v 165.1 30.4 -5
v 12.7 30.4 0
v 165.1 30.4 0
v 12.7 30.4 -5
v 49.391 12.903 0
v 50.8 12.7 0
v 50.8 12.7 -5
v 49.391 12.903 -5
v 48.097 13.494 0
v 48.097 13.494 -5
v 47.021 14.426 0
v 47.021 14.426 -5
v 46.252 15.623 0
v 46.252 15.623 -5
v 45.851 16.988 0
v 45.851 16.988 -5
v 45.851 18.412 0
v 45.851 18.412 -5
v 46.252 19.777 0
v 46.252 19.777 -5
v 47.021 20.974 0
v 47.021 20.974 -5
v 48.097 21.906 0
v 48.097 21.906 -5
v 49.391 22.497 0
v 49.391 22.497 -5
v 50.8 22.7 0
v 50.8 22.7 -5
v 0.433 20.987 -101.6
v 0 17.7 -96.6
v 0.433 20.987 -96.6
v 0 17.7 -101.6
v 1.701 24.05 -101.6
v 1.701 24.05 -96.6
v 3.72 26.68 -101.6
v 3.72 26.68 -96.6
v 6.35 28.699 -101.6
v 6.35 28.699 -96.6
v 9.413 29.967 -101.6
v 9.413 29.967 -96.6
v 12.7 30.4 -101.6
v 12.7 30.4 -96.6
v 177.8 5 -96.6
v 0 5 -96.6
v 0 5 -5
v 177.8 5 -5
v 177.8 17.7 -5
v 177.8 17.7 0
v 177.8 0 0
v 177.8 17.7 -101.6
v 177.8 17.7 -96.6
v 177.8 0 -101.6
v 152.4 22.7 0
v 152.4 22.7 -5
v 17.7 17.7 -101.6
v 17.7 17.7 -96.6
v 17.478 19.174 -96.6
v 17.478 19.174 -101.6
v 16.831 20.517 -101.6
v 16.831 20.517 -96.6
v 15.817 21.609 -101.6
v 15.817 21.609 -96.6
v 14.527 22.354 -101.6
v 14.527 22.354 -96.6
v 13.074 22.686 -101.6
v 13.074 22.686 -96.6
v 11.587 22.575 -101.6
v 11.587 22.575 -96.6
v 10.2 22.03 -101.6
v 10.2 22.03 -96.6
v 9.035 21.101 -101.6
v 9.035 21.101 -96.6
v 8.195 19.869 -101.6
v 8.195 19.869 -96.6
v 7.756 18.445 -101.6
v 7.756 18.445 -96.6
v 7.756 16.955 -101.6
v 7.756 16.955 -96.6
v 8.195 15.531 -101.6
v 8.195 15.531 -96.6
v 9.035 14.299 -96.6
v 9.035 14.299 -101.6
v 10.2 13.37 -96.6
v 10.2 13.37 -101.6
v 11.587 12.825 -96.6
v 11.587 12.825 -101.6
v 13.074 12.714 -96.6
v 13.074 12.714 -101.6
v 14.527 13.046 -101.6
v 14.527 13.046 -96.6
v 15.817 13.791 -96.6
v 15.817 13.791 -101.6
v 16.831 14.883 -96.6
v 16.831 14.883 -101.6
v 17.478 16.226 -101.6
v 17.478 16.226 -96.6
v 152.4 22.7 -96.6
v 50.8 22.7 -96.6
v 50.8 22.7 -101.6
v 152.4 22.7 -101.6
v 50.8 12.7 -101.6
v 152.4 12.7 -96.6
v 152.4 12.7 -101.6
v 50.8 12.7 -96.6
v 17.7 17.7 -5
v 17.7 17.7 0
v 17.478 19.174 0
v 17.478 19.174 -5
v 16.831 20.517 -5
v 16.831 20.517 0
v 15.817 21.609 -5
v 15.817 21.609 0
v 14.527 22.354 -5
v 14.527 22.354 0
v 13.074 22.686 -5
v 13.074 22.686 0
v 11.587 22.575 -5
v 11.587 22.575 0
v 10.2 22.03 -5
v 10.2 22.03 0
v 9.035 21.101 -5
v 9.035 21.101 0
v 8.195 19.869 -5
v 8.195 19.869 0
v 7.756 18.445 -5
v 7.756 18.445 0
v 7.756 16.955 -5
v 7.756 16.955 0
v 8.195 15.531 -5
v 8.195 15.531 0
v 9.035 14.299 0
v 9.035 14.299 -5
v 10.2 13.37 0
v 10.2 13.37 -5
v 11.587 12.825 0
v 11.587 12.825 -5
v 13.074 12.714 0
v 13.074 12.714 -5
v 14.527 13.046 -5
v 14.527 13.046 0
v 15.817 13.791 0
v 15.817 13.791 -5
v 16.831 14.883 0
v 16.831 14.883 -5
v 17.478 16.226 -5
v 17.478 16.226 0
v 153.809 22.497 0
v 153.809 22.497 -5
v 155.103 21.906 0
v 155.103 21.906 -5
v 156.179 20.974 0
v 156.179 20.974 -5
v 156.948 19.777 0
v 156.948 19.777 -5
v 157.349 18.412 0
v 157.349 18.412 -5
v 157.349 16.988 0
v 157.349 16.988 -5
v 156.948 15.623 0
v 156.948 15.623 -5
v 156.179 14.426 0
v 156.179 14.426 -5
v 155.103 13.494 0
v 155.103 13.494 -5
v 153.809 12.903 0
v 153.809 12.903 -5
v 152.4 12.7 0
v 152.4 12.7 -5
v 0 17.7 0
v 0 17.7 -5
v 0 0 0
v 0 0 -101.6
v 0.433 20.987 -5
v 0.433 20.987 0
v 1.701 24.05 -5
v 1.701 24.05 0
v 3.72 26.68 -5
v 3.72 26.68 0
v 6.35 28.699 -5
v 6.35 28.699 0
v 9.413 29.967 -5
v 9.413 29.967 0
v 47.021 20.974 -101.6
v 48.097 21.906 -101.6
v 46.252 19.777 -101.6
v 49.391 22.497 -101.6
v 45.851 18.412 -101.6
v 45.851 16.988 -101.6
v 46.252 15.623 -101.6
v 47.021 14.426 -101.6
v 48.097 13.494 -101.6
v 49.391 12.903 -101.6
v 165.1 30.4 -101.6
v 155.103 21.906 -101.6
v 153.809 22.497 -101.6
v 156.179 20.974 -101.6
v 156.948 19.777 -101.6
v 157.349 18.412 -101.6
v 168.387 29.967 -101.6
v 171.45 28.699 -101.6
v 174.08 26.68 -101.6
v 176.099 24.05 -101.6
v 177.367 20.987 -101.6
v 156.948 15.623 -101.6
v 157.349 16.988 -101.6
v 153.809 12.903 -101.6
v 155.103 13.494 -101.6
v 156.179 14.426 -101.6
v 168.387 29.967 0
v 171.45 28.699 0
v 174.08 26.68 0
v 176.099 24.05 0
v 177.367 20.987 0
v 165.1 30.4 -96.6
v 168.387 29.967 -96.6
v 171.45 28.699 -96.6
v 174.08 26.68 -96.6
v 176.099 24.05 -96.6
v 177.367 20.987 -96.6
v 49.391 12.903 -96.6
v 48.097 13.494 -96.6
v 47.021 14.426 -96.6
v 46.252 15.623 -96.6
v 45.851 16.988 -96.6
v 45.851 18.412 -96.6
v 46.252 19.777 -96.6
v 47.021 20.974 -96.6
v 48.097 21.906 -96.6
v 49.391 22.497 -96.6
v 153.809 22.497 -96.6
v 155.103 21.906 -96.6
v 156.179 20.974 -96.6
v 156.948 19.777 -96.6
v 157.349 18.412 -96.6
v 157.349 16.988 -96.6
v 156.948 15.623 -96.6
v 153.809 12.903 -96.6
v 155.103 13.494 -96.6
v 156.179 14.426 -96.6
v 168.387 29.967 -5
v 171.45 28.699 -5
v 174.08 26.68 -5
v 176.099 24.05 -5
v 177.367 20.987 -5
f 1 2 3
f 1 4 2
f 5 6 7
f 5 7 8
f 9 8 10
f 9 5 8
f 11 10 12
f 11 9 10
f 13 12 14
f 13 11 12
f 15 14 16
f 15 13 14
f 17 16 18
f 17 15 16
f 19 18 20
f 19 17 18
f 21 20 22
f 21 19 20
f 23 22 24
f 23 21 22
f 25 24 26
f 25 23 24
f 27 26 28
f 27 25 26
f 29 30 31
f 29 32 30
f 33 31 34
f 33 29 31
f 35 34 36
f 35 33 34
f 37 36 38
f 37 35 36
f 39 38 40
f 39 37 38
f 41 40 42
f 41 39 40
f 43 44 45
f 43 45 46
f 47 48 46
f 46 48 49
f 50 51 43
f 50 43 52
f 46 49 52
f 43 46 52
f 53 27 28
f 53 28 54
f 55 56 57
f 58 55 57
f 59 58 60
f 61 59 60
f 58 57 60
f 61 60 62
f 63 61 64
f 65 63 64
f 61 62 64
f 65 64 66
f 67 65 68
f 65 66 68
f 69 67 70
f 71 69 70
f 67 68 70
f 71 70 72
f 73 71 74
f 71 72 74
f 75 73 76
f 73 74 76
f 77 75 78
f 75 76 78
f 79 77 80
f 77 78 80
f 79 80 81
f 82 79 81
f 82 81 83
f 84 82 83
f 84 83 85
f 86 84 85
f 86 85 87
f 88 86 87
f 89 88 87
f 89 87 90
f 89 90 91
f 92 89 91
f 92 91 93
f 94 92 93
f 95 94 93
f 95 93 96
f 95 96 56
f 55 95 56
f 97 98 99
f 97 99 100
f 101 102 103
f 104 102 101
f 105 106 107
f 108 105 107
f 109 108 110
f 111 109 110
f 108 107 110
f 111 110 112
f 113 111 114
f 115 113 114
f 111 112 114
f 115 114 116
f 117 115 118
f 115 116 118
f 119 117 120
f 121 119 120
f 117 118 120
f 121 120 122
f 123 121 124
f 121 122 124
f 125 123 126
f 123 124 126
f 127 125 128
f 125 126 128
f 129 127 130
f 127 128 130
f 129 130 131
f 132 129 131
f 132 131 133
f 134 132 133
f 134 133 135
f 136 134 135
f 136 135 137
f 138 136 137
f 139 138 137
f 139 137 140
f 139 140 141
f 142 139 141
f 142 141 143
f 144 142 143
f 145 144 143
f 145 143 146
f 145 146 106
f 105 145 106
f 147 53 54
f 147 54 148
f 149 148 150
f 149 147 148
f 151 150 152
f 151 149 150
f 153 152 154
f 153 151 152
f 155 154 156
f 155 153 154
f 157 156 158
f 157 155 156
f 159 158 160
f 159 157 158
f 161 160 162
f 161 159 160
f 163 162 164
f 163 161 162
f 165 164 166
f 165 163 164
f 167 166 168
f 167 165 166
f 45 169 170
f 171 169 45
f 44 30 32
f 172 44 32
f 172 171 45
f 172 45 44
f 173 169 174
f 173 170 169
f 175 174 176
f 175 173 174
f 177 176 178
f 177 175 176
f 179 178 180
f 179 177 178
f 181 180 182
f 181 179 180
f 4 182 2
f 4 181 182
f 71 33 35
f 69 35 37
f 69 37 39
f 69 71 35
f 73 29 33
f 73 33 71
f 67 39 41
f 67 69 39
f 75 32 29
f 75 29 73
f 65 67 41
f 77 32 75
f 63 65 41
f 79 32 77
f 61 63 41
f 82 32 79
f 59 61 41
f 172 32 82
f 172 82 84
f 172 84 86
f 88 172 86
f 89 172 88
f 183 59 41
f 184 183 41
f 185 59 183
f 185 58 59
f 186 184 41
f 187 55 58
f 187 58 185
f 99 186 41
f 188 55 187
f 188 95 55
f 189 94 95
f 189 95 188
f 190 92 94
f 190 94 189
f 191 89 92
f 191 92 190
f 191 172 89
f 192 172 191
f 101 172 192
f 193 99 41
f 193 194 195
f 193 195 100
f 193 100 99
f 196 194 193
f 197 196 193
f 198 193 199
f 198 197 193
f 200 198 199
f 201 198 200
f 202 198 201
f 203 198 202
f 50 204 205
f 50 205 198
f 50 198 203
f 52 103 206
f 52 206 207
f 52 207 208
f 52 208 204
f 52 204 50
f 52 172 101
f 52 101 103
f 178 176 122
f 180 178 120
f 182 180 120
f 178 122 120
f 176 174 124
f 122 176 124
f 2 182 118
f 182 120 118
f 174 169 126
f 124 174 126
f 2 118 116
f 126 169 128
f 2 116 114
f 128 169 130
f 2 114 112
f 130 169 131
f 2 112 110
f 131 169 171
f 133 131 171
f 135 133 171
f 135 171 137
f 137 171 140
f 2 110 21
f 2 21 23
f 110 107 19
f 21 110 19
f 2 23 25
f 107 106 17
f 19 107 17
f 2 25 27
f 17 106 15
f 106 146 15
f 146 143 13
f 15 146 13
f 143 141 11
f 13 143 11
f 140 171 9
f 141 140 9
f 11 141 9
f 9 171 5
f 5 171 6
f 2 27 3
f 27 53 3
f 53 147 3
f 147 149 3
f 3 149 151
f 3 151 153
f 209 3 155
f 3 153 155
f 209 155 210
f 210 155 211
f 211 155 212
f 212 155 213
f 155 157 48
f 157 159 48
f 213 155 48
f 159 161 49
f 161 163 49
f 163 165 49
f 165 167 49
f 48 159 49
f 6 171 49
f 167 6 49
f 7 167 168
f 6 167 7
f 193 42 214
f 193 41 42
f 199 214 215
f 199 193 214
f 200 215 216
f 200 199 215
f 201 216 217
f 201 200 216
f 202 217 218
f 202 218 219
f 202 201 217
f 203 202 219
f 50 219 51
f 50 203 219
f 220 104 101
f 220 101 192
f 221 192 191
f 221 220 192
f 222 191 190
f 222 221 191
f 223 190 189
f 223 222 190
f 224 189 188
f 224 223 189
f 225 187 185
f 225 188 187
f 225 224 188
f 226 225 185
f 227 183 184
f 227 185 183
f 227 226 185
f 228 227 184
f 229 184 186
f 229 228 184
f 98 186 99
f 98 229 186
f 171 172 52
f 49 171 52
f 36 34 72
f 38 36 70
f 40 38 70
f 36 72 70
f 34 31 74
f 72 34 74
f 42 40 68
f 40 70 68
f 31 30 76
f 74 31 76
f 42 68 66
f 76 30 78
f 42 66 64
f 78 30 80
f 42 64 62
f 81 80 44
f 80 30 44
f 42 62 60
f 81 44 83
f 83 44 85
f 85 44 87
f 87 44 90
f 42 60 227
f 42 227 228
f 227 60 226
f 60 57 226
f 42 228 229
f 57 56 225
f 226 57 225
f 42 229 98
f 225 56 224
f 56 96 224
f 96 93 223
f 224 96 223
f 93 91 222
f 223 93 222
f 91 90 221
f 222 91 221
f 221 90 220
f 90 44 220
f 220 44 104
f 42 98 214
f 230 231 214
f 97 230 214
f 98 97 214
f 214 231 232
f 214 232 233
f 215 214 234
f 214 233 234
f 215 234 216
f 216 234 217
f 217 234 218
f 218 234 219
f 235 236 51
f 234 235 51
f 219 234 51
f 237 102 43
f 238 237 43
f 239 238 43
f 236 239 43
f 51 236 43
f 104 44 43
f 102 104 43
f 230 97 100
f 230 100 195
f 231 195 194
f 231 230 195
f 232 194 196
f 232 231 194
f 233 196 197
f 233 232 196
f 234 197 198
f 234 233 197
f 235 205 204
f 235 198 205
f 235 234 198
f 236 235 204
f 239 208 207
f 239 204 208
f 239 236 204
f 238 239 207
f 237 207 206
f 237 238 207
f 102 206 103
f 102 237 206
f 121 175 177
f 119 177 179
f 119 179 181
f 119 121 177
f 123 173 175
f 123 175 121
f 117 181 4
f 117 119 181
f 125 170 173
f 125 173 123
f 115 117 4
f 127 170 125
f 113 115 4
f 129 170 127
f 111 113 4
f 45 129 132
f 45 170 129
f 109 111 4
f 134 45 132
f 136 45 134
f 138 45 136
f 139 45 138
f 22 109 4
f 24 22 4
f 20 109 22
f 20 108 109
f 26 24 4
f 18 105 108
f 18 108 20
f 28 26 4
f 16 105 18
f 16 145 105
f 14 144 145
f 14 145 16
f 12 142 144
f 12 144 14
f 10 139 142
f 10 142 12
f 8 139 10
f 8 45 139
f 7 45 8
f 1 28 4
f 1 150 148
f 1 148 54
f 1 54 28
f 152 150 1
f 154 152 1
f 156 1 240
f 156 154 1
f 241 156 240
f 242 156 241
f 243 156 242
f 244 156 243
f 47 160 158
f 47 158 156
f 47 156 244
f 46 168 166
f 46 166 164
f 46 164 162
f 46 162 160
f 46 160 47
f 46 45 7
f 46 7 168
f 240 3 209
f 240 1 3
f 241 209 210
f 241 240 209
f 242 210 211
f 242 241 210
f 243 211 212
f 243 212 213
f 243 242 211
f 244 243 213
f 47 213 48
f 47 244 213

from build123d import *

# Parameters (mm, degrees)
SKETCH2_W           = 177.8
SKETCH2_H           = 101.6
BOSS_EXTRUDE1_DEPTH = 5
SKETCH3_W           = 177.8
SKETCH3_H           = 5
BOSS_EXTRUDE3_DEPTH = 25.4
SKETCH4_R           = 5
CUT_EXTRUDE1_DEPTH  = 208.025505675
FILLET1_R           = 12.7


with BuildPart() as part:
    # Sketch2 → Boss-Extrude1 (new body)
    with BuildSketch(Plane(origin=(0, 0, 0), x_dir=(1, 0, 0), z_dir=(0, 1, 0))):
        with Locations((88.9, 50.8)):
            Rectangle(SKETCH2_W, SKETCH2_H)
    extrude(amount=BOSS_EXTRUDE1_DEPTH)

    # Sketch3 → Boss-Extrude3 (add)
    with BuildSketch(Plane(origin=(0, 5, 0), x_dir=(1, 0, 0), z_dir=(0, 1, 0))):
        with Locations((88.9, 2.5)):
            Rectangle(SKETCH3_W, SKETCH3_H)
        with Locations((88.9, 99.1)):
            Rectangle(SKETCH3_W, SKETCH3_H)
    extrude(amount=BOSS_EXTRUDE3_DEPTH)

    # Sketch4 → Cut-Extrude1 (cut, through all)
    with BuildSketch(Plane.XY):
        with Locations((12.7, 17.7)):
            Circle(SKETCH4_R)
        with BuildLine():
            Line((50.8, 22.7), (152.4, 22.7))
            ThreePointArc((152.4, 22.7), (157.4, 17.7), (152.4, 12.7))
            Line((152.4, 12.7), (50.8, 12.7))
            ThreePointArc((50.8, 12.7), (45.8, 17.7), (50.8, 22.7))
        make_face()
    extrude(amount=-CUT_EXTRUDE1_DEPTH, mode=Mode.SUBTRACT)

    # Fillet1
    fillet1_edges = [part.edges().sort_by_distance(p)[0] for p in [
        (0, 30.4, -2.5),
        (177.8, 30.4, -2.5),
        (0, 30.4, -99.1),
        (177.8, 30.4, -99.1),
    ]]
    fillet(fillet1_edges, radius=FILLET1_R)


solid = part.part
